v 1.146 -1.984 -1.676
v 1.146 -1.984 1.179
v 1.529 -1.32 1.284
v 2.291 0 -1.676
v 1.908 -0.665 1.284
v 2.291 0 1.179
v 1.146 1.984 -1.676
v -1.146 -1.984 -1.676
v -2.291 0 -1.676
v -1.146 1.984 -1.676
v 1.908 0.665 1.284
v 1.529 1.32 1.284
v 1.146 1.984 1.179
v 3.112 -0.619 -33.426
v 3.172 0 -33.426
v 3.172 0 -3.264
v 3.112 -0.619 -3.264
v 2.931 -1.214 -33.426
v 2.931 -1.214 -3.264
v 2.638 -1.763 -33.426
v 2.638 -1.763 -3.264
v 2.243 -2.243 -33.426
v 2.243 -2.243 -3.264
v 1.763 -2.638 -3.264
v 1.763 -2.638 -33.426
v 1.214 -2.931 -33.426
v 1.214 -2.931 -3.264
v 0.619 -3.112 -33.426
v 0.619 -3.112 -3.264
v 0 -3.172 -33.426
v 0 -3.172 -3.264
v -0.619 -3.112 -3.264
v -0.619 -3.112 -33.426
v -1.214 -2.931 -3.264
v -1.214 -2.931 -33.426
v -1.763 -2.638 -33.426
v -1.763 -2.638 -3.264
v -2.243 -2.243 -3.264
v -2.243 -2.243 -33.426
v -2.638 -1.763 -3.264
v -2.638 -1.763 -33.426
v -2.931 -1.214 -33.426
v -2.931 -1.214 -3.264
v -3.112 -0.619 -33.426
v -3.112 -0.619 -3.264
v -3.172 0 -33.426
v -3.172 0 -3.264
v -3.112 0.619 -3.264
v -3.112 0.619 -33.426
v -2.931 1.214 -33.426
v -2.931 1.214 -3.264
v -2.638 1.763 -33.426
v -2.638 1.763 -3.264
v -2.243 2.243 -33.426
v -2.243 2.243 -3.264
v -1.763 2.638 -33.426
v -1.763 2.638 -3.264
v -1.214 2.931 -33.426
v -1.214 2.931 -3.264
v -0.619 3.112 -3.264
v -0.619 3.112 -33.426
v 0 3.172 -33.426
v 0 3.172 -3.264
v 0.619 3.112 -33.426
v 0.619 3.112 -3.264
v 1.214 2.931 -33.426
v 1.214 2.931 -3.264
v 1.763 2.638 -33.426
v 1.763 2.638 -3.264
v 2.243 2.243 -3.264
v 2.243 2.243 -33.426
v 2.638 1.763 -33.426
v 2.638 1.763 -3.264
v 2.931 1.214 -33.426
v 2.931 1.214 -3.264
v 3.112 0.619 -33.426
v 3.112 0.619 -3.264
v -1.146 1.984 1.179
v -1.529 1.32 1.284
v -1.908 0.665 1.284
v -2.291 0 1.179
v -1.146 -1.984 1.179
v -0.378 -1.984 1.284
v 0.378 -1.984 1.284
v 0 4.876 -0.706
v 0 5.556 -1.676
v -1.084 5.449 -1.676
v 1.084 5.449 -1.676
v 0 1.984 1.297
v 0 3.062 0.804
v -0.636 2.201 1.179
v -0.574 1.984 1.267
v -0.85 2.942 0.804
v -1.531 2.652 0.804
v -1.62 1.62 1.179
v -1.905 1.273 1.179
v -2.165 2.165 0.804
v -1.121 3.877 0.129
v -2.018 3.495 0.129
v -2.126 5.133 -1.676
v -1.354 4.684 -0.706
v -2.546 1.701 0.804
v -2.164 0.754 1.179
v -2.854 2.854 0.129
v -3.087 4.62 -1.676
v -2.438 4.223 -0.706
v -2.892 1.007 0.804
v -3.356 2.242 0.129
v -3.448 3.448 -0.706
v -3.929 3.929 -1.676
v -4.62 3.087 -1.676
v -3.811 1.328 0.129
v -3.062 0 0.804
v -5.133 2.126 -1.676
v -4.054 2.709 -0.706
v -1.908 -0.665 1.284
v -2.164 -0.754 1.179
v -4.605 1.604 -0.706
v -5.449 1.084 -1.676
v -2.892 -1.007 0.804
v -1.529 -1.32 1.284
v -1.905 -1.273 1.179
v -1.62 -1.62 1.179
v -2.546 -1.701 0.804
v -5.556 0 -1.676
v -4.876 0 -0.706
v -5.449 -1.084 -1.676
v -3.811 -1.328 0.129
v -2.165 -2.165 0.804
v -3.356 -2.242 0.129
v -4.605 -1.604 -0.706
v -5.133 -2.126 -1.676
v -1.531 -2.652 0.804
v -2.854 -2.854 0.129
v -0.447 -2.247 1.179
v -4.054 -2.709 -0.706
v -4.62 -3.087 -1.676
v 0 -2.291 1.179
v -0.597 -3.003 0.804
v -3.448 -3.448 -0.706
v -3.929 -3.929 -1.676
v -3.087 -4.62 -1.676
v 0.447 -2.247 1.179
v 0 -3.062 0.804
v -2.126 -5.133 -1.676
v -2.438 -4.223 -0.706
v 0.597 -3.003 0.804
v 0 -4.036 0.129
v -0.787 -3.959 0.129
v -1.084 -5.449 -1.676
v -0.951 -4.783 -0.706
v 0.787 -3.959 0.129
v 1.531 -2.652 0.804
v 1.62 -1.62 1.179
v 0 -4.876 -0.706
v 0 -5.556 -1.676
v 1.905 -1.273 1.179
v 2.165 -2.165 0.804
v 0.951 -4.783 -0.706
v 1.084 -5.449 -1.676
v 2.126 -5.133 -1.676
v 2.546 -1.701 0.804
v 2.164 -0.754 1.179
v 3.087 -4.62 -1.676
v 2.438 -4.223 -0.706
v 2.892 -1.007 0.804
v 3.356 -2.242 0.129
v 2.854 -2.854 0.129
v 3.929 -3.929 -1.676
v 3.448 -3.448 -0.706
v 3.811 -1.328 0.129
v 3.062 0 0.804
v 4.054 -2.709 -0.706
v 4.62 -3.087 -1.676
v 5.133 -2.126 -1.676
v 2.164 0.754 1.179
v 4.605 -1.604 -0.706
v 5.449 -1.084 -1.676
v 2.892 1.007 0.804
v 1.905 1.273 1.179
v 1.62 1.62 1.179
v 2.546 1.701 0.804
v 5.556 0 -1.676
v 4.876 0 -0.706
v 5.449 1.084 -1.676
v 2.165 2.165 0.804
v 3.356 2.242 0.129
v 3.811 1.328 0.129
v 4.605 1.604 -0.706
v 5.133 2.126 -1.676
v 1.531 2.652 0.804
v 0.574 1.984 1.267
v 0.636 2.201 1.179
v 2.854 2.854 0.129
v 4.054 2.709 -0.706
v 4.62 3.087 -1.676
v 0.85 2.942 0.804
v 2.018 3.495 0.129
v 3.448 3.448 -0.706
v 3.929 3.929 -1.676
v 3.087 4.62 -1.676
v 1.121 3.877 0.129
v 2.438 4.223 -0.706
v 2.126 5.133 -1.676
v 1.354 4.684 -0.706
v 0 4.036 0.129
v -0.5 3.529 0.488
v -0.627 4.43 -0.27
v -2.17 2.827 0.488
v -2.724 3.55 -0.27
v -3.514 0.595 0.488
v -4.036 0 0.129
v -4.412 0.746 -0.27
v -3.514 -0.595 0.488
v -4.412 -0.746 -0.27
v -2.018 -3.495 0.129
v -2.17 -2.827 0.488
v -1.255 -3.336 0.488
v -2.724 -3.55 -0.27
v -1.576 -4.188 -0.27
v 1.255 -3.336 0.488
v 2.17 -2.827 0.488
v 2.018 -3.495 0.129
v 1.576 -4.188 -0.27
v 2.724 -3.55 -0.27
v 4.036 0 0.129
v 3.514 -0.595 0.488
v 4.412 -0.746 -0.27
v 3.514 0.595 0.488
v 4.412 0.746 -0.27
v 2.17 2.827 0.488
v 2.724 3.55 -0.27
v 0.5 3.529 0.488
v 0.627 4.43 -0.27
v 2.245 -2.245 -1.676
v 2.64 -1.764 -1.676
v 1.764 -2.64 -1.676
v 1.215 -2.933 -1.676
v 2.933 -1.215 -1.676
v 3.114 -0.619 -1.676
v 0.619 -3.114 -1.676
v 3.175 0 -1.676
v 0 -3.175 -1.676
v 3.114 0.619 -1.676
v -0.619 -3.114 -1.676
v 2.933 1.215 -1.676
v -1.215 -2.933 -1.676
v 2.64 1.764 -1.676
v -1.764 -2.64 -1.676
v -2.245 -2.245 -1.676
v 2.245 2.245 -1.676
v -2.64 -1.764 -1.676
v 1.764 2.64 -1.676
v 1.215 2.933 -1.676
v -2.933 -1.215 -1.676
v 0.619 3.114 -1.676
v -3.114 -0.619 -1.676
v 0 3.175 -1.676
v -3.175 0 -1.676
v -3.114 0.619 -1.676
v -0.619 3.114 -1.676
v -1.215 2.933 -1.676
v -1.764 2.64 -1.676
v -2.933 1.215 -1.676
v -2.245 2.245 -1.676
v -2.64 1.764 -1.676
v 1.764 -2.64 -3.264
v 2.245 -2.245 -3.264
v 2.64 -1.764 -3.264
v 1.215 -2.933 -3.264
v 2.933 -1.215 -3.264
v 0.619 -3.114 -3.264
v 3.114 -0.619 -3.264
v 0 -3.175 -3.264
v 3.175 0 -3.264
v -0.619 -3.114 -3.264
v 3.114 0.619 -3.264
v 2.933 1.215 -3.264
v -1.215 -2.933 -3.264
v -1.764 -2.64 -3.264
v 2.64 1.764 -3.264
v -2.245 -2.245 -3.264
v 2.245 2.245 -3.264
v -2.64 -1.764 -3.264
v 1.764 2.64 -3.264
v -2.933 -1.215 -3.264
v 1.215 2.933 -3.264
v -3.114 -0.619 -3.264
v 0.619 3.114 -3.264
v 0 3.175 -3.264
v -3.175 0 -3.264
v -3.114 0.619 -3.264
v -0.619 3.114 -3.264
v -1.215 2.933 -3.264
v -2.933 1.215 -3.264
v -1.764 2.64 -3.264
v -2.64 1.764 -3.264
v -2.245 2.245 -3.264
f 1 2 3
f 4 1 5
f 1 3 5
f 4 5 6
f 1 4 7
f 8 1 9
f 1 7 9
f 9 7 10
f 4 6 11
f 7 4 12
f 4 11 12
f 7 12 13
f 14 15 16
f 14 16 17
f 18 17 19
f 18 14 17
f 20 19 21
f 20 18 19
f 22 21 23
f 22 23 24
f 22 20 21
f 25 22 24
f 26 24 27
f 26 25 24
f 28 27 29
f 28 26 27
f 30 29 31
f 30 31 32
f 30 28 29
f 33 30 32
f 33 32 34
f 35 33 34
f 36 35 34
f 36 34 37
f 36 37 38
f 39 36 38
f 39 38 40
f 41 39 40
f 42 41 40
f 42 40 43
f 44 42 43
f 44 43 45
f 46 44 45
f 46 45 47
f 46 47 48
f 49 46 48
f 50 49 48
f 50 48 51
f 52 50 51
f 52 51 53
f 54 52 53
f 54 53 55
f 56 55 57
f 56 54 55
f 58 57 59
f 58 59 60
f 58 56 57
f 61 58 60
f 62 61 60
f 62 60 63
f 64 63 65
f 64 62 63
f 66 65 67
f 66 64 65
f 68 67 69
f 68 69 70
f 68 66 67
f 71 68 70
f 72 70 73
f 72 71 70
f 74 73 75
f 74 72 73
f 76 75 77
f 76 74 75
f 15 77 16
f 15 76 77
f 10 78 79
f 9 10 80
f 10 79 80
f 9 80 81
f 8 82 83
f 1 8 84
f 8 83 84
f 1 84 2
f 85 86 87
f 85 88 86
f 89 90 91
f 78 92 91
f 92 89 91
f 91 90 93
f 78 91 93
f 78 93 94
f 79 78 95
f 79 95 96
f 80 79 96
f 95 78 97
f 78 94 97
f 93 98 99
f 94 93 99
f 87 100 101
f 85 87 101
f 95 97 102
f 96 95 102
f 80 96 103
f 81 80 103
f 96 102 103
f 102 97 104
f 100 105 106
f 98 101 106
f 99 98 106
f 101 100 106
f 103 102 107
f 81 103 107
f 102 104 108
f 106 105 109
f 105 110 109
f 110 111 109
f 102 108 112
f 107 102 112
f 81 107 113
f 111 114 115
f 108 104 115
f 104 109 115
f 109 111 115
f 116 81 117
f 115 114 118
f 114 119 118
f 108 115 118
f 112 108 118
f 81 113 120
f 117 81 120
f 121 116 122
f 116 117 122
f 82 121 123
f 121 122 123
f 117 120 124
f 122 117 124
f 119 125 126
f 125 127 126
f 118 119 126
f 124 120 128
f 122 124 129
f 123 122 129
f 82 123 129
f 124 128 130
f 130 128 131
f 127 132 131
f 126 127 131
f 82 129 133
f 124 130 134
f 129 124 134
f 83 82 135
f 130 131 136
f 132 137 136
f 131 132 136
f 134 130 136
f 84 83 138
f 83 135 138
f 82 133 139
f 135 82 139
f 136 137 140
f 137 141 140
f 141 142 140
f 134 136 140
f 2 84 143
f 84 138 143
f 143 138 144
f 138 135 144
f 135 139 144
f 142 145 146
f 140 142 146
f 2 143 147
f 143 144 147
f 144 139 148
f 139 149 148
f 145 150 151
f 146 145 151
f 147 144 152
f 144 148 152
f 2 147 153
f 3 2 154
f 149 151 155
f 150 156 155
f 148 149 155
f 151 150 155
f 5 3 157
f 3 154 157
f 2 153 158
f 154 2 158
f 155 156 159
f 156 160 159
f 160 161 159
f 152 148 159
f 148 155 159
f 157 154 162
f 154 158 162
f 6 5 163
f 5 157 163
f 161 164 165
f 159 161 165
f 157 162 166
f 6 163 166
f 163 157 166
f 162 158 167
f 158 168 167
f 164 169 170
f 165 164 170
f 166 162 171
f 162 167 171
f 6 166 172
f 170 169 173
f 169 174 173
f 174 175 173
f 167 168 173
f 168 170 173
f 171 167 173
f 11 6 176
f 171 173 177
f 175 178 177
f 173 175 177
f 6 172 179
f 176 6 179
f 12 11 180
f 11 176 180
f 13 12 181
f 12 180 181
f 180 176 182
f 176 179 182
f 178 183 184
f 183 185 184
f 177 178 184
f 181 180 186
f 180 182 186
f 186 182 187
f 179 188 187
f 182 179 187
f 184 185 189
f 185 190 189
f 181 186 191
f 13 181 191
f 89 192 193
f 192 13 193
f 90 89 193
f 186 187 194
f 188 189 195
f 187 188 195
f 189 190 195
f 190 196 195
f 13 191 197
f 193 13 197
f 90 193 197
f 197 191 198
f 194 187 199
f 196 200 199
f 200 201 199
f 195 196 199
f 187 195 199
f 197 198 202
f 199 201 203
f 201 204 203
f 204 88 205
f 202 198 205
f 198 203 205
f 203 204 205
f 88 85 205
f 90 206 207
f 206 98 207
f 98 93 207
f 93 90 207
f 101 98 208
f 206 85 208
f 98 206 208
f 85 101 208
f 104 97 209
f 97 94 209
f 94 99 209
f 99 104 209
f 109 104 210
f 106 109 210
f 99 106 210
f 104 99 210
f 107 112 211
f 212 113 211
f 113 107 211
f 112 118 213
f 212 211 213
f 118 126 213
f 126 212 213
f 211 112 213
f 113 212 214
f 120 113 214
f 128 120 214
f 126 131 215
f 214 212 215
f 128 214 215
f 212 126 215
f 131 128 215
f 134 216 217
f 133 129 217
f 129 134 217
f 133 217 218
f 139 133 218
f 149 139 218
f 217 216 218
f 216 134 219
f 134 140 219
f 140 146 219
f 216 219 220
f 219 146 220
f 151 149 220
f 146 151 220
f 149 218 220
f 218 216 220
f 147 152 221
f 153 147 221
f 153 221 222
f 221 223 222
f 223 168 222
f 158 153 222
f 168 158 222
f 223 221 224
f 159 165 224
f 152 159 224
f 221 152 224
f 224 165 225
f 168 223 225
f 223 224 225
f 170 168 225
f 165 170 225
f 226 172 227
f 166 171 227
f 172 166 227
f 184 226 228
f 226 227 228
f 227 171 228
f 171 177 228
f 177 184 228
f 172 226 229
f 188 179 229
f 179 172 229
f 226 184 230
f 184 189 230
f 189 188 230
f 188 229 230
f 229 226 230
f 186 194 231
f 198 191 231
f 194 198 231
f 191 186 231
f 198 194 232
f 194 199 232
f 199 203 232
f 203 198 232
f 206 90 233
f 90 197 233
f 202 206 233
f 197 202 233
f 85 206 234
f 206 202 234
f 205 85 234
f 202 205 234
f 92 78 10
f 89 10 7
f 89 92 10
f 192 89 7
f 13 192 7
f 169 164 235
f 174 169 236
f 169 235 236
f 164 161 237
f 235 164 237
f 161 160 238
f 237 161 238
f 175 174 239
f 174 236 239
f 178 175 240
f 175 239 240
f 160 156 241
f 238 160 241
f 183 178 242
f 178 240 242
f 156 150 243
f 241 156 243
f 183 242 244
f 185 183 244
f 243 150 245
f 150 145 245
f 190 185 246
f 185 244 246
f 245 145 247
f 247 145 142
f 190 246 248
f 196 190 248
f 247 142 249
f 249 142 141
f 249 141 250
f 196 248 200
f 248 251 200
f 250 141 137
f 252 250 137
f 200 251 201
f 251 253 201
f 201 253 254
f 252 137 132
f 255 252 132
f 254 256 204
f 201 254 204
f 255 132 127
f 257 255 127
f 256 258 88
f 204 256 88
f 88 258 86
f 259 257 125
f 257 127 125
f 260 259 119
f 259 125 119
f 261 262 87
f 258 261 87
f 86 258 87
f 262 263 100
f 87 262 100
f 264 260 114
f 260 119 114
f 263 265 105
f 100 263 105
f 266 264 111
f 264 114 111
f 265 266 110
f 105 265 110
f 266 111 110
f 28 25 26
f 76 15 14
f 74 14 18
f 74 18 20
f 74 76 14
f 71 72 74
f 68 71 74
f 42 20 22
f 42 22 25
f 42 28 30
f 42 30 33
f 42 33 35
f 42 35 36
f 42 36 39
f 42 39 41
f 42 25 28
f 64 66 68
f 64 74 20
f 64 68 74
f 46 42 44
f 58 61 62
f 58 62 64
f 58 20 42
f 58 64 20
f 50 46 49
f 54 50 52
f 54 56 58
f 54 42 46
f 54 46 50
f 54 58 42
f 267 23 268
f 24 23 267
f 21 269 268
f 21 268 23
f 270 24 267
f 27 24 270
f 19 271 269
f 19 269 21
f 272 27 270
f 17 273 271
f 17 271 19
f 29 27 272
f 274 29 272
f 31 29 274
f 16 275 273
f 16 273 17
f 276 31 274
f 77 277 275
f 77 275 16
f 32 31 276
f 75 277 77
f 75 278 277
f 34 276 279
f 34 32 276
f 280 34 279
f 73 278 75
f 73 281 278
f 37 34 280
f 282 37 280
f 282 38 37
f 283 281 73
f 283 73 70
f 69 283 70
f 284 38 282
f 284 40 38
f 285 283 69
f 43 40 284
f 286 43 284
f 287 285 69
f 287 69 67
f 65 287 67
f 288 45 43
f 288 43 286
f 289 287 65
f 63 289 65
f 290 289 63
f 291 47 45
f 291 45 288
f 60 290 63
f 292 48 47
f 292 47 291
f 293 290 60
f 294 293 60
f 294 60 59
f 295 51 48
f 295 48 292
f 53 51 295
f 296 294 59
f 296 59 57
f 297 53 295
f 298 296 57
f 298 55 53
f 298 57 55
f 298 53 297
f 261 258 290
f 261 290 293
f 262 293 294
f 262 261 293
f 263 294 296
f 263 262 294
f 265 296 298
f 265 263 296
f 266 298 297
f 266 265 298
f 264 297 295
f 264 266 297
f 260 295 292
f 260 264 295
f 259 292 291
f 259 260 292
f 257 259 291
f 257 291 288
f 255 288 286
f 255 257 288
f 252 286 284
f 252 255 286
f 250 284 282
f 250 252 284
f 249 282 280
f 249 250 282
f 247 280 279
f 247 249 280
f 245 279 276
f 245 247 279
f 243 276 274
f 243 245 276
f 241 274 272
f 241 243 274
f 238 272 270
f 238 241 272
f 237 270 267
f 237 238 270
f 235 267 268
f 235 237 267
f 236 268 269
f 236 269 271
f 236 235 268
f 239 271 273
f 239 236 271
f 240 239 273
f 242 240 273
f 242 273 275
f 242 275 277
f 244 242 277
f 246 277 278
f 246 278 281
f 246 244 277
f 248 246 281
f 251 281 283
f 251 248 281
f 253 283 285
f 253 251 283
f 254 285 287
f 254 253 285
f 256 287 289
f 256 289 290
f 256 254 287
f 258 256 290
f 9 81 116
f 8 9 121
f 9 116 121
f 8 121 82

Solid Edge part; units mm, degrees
sketch "Sketch1" plane through (0, 0, 0) normal (1, 0, 0) x (0, 1, 0)
  line L0 (0, -1.6764) -> (0, 1.6764)
  arc A0 (0, 1.6764) -> (5.55625, -1.6764) centre (-0.25374, -5.024398) cw
  line L1 (0, -1.6764) -> (5.55625, -1.6764)
  dimension "D1" = 3.3528
  dimension "D2" = 6.7056
revolve "RevolvedProtrusion1" add sketch "Sketch1" angle 360 about axis through (0, 0, -14.779625) along (0, 0, 1)
sketch "Sketch2" plane through (0, 0, -1.6764) normal (0, 0, -1) x (0, 1, 0)
  circle A0 centre (0, 0) radius 3.175
  dimension "D1" = 6.35
extrude "Protrusion1" add sketch "Sketch2" along normal blind 31.75
sketch "Sketch3" plane through (0, 0, -33.4264) normal (0, 0, -1) x (1, 0, 0)
  circle A0 centre (0, 0) radius 3.17246
  dimension "D1" = 0.0025
extrude "Cutout1" cut sketch "Sketch3" against normal blind 30.1625 flip side to cut
sketch "Sketch4" plane through (-0.603226, 0.360624, 3.3528) normal (0, 0, 1) x (1, 0, 0)
  line L0 (-0.542454, 1.623751) -> (1.748905, 1.623751)
  line L1 (2.894585, -0.360624) -> (1.748905, 1.623751)
  line L2 (1.748905, -2.344999) -> (2.894585, -0.360624)
  line L3 (-0.542454, -2.344999) -> (1.748905, -2.344999)
  line L4 (-1.688133, -0.360624) -> (-0.542454, -2.344999)
  line L5 (-0.542454, 1.623751) -> (-1.688133, -0.360624)
extrude "ExtrudedCutout_11" cut sketch "Sketch4" against normal blind 5.0292
properties part number "171348"
